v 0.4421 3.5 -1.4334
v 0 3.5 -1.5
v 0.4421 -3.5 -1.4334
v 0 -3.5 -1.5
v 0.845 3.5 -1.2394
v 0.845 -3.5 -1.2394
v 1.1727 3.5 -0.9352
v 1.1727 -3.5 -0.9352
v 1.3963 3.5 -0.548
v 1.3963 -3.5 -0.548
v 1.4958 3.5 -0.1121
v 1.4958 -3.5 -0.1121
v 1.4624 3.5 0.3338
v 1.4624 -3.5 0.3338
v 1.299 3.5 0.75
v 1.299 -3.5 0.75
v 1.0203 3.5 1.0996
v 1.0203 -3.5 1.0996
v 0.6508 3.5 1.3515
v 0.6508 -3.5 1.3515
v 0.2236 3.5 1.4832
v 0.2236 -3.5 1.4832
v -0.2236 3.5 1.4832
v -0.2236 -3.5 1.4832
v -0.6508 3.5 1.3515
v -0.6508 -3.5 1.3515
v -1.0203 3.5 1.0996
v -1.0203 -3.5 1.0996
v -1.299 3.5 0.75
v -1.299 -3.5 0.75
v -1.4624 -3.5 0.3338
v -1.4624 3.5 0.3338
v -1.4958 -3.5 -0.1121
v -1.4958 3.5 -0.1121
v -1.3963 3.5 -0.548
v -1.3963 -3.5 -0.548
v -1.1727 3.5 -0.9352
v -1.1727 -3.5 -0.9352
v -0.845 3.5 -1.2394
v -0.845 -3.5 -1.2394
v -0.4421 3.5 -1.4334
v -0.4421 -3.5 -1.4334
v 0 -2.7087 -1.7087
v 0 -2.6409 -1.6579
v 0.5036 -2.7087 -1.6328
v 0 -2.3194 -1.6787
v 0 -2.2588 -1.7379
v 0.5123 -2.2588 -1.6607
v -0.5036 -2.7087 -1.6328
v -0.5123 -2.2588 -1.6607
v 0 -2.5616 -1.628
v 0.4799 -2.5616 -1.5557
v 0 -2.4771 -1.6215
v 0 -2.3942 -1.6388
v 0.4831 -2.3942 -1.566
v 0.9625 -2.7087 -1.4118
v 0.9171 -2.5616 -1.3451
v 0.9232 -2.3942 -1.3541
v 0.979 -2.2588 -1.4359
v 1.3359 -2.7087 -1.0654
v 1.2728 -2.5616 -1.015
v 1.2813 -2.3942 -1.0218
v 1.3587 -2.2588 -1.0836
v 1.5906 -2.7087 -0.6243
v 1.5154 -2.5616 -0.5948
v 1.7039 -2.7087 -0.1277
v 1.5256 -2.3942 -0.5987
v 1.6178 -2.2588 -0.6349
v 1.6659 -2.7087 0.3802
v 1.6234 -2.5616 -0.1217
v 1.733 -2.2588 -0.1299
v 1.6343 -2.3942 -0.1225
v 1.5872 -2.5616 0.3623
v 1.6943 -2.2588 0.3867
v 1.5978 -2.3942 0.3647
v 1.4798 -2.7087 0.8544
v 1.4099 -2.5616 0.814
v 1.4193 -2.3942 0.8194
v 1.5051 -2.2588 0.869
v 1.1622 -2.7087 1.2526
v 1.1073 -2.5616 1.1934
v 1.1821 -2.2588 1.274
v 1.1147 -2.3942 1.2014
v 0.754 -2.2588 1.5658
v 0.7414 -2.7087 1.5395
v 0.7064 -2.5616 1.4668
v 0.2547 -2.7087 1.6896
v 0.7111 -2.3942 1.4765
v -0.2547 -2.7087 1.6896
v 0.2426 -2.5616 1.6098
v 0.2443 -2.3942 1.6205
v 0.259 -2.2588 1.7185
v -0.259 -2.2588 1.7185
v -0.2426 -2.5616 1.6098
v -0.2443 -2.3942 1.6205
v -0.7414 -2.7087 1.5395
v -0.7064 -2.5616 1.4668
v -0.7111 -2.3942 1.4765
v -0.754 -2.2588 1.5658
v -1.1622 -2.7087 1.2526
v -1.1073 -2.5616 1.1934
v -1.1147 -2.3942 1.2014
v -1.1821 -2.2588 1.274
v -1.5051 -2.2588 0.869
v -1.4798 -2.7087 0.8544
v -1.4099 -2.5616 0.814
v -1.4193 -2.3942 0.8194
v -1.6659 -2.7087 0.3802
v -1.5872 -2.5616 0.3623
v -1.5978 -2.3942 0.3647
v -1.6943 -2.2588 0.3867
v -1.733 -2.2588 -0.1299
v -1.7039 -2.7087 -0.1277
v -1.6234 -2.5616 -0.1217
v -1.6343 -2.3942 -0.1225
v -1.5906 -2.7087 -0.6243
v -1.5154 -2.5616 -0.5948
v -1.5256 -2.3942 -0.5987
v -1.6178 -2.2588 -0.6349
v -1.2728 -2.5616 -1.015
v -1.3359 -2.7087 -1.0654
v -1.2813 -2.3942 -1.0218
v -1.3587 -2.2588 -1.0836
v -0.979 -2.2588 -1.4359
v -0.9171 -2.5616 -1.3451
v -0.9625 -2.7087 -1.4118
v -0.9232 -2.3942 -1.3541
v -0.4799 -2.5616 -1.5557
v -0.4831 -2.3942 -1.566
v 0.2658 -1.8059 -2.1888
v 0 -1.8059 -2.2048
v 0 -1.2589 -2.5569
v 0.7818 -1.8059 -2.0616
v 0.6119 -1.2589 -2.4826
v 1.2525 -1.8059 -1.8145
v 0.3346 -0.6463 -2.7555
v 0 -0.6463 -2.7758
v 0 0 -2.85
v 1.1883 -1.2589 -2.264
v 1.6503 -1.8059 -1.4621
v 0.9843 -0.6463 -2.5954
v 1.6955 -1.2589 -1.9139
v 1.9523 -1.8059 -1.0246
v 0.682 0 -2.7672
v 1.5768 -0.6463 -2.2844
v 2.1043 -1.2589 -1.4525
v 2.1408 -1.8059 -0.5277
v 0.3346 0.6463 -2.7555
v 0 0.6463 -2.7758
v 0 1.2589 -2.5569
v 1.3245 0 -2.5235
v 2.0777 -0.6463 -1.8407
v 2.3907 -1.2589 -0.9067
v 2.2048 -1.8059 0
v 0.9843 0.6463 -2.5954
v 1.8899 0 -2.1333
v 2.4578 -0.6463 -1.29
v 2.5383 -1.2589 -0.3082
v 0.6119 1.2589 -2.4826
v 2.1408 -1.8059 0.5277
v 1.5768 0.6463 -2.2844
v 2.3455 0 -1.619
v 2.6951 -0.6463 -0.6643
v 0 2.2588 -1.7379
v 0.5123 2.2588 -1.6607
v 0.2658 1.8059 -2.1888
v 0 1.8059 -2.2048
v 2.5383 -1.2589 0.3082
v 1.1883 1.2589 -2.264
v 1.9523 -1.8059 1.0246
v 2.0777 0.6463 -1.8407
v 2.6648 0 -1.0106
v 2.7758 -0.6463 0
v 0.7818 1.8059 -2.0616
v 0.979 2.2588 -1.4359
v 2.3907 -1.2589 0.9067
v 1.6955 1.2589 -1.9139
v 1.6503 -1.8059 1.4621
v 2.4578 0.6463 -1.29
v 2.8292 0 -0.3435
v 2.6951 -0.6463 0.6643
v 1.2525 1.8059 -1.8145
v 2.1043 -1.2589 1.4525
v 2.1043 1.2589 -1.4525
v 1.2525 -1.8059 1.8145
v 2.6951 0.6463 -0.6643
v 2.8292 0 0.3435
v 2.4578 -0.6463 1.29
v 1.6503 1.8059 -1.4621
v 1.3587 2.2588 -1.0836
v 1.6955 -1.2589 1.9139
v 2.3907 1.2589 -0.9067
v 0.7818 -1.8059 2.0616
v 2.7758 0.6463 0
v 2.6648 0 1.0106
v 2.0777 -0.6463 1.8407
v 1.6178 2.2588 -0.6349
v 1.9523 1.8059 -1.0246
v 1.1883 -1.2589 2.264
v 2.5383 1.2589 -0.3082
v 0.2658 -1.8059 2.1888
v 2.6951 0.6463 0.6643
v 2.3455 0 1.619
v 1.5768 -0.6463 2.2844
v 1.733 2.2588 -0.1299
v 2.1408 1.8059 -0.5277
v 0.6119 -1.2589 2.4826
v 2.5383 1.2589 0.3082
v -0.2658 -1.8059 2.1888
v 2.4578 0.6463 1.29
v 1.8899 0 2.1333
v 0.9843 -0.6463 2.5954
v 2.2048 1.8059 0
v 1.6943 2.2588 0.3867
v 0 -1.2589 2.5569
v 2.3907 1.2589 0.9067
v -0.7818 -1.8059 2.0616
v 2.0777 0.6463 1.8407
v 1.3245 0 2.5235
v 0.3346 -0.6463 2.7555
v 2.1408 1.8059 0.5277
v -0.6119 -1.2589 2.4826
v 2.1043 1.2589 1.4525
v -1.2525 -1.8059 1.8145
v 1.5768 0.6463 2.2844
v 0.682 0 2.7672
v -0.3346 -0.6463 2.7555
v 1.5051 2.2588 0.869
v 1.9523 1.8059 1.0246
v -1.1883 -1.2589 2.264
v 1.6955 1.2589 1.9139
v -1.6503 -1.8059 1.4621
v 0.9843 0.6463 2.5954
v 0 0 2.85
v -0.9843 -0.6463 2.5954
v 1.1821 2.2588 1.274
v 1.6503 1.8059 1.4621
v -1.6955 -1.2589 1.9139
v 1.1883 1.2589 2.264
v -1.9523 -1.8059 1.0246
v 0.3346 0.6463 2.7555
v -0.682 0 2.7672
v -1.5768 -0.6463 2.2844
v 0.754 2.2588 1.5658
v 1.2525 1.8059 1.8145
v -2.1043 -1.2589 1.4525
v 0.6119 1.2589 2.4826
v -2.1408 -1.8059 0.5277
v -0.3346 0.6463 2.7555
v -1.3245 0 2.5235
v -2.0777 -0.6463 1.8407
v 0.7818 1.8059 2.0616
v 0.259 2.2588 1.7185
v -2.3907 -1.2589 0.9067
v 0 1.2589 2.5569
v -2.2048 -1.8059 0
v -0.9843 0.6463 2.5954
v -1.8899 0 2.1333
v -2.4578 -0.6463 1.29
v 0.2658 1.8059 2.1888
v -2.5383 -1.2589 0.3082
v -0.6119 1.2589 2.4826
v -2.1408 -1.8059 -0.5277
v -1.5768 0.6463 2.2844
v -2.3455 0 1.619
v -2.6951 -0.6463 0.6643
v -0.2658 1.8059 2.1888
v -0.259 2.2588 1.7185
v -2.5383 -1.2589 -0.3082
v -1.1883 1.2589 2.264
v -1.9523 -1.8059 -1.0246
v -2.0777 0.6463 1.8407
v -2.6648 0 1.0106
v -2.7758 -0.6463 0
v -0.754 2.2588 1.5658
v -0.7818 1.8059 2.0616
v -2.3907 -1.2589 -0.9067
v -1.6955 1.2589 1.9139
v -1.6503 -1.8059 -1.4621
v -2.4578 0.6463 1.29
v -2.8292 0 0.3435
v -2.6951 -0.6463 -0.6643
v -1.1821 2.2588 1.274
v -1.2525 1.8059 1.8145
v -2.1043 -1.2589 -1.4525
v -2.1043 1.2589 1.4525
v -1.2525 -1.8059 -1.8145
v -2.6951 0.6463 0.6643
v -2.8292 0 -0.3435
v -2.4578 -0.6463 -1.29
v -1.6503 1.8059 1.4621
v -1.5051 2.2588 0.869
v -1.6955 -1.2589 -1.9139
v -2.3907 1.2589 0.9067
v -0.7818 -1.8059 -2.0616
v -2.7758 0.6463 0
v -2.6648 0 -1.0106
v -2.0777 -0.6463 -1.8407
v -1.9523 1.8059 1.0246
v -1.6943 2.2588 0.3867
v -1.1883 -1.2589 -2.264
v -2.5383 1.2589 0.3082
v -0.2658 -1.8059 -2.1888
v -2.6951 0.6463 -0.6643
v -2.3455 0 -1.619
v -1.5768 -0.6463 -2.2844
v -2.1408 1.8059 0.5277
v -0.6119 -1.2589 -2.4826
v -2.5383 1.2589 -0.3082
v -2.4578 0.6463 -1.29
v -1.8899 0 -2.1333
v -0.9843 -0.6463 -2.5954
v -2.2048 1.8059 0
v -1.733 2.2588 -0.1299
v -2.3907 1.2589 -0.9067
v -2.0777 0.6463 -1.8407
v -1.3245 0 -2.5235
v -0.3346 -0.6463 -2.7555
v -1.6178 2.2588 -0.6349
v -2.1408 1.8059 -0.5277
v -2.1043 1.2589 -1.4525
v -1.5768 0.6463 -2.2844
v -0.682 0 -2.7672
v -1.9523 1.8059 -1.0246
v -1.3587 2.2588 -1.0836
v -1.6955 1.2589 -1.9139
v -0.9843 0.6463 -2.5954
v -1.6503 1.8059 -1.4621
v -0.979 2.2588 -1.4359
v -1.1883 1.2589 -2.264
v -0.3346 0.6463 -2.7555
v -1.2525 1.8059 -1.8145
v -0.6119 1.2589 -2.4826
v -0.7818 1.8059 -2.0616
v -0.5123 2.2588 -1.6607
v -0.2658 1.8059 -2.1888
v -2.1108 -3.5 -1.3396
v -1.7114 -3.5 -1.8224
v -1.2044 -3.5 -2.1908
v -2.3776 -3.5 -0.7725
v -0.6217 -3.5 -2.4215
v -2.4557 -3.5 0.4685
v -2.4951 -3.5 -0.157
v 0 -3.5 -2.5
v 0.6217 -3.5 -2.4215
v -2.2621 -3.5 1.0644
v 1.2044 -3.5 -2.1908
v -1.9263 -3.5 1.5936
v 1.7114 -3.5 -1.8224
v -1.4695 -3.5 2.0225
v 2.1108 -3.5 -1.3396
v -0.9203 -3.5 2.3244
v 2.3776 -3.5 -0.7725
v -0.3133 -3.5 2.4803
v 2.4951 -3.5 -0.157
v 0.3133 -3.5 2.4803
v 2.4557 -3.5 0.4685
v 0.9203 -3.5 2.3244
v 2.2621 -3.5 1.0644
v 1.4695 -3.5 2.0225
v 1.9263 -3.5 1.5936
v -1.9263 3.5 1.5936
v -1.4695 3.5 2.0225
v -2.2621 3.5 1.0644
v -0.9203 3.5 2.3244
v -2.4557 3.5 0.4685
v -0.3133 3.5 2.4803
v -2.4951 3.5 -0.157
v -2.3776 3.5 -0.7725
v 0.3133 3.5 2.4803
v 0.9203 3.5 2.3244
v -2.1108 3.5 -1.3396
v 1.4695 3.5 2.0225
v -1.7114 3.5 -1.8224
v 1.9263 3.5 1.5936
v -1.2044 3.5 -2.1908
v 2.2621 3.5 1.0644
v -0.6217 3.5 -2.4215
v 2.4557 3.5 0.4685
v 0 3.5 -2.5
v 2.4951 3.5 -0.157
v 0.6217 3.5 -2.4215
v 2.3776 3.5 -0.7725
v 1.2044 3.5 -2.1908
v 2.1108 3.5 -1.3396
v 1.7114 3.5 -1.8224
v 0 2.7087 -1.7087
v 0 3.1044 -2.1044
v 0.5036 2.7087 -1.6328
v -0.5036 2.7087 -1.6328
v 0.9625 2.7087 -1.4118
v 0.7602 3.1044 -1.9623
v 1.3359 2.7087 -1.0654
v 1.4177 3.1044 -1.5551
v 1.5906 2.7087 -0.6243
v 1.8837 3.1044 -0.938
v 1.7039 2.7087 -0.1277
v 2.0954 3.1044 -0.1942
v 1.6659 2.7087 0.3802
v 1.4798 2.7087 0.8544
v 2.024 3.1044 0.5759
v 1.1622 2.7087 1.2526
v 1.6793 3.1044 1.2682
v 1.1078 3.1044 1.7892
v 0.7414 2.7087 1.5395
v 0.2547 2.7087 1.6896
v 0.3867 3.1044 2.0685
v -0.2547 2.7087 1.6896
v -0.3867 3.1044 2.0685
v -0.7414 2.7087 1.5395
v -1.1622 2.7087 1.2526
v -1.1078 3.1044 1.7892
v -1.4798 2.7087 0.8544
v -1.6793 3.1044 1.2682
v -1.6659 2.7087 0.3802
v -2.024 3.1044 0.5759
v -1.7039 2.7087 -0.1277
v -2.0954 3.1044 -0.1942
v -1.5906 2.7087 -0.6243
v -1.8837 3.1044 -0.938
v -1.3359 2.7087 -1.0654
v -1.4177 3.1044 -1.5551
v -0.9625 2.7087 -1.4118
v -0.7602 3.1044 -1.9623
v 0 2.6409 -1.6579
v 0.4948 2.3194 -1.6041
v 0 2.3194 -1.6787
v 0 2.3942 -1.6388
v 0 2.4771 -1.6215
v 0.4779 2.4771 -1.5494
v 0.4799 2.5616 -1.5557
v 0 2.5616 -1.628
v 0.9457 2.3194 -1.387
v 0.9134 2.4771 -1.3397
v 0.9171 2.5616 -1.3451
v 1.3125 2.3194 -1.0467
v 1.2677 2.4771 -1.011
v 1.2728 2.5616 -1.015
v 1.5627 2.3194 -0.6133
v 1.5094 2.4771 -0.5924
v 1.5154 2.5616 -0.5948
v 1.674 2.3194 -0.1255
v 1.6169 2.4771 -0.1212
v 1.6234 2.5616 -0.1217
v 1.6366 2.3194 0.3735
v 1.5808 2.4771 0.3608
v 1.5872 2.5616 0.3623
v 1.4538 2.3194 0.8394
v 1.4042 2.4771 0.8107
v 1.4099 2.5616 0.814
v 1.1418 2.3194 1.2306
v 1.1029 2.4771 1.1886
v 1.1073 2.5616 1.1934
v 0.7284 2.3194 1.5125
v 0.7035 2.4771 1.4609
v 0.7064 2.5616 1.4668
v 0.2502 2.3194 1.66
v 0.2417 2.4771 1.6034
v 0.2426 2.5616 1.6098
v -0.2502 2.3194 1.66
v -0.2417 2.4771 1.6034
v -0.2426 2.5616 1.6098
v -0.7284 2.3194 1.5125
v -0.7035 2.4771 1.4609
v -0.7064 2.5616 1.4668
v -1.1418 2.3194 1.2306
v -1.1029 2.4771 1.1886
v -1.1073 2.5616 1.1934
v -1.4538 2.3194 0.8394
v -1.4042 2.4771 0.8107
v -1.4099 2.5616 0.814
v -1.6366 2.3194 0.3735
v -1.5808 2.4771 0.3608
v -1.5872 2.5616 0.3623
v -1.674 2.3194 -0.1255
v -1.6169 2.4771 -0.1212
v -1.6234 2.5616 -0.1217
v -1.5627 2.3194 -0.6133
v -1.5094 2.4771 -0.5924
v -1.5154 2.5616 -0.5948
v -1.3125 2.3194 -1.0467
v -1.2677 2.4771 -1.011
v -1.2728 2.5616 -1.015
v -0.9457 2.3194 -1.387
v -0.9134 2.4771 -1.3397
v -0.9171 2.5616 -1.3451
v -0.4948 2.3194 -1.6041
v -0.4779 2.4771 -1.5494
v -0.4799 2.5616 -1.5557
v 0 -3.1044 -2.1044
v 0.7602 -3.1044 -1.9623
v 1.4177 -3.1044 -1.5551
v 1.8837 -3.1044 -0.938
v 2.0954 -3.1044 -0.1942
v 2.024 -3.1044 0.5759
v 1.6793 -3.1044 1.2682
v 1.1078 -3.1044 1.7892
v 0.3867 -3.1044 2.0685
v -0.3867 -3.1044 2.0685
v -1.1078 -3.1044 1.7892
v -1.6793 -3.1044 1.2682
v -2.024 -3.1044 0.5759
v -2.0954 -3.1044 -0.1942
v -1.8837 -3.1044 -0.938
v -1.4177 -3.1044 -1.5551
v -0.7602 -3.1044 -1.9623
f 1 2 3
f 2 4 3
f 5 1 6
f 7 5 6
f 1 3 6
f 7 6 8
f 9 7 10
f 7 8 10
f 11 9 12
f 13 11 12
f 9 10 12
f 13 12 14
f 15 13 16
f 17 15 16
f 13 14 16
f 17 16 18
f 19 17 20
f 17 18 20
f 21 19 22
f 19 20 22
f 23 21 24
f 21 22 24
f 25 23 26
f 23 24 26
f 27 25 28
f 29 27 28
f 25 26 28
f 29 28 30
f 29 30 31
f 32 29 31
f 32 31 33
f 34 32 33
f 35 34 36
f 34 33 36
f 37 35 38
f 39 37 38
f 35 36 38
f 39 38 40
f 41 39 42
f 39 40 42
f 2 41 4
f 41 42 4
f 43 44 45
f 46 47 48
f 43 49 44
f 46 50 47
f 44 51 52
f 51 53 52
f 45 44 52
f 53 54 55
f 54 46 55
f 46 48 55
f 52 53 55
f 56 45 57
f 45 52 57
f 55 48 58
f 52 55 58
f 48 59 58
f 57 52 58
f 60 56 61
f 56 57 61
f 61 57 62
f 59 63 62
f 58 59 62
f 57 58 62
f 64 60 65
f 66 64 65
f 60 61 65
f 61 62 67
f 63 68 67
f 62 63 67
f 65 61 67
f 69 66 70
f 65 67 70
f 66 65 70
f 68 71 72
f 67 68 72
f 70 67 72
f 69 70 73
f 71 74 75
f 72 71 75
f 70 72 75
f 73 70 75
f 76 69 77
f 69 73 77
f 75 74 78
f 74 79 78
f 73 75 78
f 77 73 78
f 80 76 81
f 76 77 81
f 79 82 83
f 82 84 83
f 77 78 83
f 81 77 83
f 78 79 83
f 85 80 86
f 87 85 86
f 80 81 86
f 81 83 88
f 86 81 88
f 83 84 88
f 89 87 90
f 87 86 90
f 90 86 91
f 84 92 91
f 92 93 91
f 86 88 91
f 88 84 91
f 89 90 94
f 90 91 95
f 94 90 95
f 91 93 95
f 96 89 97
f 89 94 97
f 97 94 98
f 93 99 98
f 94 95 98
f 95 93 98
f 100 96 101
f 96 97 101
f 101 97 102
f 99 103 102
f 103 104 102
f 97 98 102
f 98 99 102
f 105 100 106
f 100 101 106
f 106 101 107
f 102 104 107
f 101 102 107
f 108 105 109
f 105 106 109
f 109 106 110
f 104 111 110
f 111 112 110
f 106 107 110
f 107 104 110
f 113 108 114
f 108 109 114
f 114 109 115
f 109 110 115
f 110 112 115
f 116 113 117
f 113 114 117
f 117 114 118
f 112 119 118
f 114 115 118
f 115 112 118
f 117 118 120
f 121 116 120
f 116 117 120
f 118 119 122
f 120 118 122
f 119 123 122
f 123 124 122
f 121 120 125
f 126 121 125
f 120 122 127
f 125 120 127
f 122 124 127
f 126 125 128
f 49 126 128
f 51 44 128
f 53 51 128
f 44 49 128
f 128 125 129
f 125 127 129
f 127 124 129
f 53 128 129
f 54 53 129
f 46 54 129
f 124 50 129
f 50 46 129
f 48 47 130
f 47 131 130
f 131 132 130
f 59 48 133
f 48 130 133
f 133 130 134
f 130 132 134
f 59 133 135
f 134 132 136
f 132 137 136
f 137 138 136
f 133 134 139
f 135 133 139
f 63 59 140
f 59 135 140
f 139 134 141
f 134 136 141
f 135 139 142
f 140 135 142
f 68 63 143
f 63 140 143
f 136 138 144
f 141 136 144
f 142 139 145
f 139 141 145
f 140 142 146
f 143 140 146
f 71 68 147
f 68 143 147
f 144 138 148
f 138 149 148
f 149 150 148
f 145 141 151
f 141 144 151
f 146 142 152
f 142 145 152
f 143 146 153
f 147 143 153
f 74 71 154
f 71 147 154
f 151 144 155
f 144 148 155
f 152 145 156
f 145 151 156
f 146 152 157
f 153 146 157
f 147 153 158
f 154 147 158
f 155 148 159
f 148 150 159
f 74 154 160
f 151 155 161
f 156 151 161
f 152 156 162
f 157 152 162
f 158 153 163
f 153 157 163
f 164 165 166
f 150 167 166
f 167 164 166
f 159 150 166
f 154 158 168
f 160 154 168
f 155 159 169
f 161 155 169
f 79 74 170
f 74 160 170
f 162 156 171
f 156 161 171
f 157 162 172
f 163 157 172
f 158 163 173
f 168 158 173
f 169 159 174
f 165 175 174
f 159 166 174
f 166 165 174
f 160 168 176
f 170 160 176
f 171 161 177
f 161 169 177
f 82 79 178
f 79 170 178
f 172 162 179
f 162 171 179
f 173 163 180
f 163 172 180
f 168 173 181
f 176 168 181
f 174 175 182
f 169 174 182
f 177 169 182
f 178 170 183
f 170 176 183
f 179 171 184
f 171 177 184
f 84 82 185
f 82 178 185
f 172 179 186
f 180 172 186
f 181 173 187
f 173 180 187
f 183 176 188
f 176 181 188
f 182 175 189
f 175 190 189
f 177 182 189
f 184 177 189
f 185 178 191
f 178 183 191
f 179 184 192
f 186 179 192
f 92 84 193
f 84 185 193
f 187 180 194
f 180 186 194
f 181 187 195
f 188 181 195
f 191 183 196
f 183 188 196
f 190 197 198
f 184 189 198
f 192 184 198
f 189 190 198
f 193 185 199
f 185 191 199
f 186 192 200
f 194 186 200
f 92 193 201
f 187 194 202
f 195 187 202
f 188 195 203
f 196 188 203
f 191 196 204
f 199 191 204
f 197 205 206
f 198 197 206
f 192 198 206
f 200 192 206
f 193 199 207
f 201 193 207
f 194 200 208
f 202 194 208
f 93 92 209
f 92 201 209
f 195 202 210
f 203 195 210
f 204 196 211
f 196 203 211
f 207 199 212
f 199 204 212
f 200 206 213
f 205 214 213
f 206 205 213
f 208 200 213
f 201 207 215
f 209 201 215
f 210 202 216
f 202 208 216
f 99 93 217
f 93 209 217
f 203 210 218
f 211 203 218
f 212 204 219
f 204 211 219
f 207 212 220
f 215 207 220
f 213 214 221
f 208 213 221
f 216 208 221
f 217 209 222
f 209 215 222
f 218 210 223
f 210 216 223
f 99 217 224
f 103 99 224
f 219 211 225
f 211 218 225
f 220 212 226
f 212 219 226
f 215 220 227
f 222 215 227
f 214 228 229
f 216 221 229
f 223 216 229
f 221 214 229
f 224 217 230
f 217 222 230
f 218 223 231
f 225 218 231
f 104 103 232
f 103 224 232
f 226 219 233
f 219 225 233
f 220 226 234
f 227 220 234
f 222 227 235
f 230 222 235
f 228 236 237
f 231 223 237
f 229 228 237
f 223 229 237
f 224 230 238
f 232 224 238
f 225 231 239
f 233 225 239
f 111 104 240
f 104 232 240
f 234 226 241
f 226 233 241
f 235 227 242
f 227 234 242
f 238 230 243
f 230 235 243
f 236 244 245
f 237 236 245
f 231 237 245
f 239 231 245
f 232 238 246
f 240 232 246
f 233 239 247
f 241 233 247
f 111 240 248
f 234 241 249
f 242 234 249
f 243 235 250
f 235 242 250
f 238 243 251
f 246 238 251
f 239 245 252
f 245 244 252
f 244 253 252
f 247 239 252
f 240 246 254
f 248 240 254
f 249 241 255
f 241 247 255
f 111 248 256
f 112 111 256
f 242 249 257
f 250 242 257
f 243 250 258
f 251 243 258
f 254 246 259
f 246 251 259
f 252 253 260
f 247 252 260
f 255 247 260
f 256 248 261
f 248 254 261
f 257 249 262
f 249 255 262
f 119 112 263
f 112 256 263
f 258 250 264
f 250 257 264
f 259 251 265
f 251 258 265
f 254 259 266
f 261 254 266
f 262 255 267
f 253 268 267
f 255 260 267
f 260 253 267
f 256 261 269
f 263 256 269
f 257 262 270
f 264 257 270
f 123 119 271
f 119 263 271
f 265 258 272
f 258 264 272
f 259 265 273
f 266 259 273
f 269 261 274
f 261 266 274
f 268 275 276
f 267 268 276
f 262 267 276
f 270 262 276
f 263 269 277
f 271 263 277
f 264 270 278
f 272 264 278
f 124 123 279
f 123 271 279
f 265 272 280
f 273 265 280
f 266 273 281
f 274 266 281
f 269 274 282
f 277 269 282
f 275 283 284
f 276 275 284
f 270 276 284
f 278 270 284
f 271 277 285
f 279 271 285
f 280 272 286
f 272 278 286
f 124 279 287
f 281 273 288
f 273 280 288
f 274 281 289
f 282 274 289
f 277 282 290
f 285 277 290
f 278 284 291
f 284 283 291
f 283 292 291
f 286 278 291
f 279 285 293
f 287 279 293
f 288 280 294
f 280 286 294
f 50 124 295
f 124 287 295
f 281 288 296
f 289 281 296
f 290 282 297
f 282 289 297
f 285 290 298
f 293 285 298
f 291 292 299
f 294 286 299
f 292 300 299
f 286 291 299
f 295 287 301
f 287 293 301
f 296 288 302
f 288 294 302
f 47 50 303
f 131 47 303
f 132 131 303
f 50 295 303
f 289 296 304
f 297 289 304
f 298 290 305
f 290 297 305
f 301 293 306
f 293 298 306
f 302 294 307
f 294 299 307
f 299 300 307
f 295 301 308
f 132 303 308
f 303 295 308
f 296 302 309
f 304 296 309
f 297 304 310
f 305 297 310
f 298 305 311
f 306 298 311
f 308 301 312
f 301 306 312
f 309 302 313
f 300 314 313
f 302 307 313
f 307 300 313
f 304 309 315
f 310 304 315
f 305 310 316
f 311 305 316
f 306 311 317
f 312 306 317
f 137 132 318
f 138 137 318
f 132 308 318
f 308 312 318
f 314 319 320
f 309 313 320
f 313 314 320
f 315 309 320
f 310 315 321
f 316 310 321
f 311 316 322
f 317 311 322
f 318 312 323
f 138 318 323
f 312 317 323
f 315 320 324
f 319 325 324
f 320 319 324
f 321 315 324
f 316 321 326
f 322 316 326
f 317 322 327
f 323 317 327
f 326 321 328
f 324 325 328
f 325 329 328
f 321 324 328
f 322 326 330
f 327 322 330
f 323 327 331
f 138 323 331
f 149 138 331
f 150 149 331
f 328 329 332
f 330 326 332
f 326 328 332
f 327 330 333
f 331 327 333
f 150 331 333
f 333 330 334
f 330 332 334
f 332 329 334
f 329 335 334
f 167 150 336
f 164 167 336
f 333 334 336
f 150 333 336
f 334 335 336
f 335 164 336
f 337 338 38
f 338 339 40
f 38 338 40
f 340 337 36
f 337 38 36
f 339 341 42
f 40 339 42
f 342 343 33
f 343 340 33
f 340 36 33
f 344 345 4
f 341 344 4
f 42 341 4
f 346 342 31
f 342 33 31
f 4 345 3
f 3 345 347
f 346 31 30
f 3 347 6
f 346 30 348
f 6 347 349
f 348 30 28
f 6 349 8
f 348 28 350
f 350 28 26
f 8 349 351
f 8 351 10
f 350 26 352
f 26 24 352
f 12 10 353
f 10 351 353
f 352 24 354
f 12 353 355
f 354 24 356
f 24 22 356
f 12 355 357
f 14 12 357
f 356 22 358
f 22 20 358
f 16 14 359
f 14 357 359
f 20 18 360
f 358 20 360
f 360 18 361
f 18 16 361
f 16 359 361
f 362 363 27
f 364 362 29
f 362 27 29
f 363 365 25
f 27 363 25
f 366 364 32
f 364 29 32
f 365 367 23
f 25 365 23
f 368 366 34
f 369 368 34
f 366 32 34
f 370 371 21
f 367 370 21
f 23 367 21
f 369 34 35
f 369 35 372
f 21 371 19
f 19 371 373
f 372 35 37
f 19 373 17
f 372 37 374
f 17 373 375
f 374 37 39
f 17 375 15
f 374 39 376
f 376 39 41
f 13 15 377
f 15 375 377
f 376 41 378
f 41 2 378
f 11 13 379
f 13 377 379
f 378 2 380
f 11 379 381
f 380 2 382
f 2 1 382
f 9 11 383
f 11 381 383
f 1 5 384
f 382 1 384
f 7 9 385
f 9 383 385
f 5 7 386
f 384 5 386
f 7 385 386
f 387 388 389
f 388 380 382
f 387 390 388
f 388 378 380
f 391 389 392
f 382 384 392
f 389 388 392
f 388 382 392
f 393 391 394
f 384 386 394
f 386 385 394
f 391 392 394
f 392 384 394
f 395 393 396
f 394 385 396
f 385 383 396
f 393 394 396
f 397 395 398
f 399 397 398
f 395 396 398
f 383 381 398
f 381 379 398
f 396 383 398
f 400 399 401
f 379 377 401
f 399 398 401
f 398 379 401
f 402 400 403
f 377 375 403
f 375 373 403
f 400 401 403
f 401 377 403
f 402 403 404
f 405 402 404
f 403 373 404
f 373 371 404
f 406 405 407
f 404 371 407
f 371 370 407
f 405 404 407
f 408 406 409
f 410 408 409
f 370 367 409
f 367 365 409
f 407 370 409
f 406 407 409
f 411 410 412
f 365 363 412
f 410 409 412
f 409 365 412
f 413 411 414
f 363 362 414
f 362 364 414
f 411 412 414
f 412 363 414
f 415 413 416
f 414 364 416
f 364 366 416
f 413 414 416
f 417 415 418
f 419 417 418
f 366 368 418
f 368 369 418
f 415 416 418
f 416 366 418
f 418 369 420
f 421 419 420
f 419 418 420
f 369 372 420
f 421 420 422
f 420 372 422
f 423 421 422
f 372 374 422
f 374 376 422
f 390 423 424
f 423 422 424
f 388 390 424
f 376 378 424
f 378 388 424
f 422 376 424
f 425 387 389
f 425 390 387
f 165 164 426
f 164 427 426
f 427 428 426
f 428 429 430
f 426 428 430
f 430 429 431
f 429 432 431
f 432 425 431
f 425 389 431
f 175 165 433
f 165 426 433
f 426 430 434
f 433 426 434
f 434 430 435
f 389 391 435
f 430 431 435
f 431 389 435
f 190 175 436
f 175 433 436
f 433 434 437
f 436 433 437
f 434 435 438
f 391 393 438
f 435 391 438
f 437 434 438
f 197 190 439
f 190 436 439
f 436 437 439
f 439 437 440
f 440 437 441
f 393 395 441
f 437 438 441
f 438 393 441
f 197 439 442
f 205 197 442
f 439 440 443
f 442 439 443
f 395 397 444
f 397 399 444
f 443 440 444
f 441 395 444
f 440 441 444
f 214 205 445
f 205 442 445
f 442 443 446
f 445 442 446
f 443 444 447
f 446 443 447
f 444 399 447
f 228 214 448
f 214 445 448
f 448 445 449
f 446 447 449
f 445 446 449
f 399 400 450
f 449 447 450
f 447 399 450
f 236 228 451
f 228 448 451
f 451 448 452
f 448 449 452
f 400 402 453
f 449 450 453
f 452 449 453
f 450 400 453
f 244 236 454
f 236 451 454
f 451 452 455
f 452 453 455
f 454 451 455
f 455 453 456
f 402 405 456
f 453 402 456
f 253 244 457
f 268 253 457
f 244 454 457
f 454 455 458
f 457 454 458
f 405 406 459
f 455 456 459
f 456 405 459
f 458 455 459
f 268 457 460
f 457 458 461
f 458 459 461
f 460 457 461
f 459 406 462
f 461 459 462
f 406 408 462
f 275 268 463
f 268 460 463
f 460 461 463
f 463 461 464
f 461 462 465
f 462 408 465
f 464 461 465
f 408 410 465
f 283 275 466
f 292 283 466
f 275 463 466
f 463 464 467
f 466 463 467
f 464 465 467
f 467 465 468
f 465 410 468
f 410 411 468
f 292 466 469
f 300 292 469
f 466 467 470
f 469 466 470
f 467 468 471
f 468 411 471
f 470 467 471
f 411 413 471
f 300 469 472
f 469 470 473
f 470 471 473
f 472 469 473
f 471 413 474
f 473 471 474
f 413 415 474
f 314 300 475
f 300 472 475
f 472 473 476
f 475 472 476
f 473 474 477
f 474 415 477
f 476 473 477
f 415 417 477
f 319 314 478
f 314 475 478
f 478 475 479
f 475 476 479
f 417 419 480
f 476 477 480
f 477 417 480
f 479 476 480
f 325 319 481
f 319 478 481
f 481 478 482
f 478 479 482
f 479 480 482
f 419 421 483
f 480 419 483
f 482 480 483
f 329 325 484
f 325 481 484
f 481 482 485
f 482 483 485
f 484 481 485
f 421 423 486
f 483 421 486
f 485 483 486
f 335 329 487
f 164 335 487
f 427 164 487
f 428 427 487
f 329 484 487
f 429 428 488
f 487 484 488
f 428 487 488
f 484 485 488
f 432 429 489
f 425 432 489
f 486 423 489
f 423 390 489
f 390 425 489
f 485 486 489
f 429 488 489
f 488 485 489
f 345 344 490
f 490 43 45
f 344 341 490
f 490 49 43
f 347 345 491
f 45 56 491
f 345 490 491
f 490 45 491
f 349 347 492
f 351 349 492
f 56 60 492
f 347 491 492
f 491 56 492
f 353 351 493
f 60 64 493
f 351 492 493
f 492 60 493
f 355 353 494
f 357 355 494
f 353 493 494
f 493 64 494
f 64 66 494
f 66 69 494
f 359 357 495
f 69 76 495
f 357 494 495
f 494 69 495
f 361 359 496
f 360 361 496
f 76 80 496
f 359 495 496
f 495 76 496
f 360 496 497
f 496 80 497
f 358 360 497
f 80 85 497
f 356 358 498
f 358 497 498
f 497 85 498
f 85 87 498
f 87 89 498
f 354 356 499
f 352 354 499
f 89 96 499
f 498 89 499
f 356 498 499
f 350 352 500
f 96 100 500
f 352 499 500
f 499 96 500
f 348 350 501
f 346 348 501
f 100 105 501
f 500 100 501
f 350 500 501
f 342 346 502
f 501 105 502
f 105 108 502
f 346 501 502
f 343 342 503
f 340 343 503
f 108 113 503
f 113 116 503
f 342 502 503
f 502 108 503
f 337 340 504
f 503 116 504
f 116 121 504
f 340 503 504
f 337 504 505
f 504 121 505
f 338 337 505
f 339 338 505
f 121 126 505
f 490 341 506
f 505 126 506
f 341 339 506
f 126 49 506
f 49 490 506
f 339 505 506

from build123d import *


with BuildPart() as part:
    # Эскиз1 → Повернуть1 (revolve)
    with BuildSketch(Plane(origin=(0, 0, 0), x_dir=(0, 0, -1), z_dir=(1, 0, 0))):
        with BuildLine():
            Line((2.5, 3.5), (1.5, 3.5))
            Line((1.5, 3.5), (1.5, -3.5))
            Line((1.5, -3.5), (2.5, -3.5))
            Line((2.5, -3.5), (1.708705964, -2.708705964))
            ThreePointArc((1.708705964, -2.708705964), (1.621467661, -2.477147118), (1.737901046, -2.258804984))
            ThreePointArc((1.737901046, -2.258804984), (2.85, 0), (1.737901046, 2.258804984))
            ThreePointArc((1.737901046, 2.258804984), (1.621467661, 2.477147118), (1.708705964, 2.708705964))
            Line((1.708705964, 2.708705964), (2.5, 3.5))
        make_face()
    revolve(axis=Axis((0, 0, 0), (0, -1, 0)))


solid = part.part
